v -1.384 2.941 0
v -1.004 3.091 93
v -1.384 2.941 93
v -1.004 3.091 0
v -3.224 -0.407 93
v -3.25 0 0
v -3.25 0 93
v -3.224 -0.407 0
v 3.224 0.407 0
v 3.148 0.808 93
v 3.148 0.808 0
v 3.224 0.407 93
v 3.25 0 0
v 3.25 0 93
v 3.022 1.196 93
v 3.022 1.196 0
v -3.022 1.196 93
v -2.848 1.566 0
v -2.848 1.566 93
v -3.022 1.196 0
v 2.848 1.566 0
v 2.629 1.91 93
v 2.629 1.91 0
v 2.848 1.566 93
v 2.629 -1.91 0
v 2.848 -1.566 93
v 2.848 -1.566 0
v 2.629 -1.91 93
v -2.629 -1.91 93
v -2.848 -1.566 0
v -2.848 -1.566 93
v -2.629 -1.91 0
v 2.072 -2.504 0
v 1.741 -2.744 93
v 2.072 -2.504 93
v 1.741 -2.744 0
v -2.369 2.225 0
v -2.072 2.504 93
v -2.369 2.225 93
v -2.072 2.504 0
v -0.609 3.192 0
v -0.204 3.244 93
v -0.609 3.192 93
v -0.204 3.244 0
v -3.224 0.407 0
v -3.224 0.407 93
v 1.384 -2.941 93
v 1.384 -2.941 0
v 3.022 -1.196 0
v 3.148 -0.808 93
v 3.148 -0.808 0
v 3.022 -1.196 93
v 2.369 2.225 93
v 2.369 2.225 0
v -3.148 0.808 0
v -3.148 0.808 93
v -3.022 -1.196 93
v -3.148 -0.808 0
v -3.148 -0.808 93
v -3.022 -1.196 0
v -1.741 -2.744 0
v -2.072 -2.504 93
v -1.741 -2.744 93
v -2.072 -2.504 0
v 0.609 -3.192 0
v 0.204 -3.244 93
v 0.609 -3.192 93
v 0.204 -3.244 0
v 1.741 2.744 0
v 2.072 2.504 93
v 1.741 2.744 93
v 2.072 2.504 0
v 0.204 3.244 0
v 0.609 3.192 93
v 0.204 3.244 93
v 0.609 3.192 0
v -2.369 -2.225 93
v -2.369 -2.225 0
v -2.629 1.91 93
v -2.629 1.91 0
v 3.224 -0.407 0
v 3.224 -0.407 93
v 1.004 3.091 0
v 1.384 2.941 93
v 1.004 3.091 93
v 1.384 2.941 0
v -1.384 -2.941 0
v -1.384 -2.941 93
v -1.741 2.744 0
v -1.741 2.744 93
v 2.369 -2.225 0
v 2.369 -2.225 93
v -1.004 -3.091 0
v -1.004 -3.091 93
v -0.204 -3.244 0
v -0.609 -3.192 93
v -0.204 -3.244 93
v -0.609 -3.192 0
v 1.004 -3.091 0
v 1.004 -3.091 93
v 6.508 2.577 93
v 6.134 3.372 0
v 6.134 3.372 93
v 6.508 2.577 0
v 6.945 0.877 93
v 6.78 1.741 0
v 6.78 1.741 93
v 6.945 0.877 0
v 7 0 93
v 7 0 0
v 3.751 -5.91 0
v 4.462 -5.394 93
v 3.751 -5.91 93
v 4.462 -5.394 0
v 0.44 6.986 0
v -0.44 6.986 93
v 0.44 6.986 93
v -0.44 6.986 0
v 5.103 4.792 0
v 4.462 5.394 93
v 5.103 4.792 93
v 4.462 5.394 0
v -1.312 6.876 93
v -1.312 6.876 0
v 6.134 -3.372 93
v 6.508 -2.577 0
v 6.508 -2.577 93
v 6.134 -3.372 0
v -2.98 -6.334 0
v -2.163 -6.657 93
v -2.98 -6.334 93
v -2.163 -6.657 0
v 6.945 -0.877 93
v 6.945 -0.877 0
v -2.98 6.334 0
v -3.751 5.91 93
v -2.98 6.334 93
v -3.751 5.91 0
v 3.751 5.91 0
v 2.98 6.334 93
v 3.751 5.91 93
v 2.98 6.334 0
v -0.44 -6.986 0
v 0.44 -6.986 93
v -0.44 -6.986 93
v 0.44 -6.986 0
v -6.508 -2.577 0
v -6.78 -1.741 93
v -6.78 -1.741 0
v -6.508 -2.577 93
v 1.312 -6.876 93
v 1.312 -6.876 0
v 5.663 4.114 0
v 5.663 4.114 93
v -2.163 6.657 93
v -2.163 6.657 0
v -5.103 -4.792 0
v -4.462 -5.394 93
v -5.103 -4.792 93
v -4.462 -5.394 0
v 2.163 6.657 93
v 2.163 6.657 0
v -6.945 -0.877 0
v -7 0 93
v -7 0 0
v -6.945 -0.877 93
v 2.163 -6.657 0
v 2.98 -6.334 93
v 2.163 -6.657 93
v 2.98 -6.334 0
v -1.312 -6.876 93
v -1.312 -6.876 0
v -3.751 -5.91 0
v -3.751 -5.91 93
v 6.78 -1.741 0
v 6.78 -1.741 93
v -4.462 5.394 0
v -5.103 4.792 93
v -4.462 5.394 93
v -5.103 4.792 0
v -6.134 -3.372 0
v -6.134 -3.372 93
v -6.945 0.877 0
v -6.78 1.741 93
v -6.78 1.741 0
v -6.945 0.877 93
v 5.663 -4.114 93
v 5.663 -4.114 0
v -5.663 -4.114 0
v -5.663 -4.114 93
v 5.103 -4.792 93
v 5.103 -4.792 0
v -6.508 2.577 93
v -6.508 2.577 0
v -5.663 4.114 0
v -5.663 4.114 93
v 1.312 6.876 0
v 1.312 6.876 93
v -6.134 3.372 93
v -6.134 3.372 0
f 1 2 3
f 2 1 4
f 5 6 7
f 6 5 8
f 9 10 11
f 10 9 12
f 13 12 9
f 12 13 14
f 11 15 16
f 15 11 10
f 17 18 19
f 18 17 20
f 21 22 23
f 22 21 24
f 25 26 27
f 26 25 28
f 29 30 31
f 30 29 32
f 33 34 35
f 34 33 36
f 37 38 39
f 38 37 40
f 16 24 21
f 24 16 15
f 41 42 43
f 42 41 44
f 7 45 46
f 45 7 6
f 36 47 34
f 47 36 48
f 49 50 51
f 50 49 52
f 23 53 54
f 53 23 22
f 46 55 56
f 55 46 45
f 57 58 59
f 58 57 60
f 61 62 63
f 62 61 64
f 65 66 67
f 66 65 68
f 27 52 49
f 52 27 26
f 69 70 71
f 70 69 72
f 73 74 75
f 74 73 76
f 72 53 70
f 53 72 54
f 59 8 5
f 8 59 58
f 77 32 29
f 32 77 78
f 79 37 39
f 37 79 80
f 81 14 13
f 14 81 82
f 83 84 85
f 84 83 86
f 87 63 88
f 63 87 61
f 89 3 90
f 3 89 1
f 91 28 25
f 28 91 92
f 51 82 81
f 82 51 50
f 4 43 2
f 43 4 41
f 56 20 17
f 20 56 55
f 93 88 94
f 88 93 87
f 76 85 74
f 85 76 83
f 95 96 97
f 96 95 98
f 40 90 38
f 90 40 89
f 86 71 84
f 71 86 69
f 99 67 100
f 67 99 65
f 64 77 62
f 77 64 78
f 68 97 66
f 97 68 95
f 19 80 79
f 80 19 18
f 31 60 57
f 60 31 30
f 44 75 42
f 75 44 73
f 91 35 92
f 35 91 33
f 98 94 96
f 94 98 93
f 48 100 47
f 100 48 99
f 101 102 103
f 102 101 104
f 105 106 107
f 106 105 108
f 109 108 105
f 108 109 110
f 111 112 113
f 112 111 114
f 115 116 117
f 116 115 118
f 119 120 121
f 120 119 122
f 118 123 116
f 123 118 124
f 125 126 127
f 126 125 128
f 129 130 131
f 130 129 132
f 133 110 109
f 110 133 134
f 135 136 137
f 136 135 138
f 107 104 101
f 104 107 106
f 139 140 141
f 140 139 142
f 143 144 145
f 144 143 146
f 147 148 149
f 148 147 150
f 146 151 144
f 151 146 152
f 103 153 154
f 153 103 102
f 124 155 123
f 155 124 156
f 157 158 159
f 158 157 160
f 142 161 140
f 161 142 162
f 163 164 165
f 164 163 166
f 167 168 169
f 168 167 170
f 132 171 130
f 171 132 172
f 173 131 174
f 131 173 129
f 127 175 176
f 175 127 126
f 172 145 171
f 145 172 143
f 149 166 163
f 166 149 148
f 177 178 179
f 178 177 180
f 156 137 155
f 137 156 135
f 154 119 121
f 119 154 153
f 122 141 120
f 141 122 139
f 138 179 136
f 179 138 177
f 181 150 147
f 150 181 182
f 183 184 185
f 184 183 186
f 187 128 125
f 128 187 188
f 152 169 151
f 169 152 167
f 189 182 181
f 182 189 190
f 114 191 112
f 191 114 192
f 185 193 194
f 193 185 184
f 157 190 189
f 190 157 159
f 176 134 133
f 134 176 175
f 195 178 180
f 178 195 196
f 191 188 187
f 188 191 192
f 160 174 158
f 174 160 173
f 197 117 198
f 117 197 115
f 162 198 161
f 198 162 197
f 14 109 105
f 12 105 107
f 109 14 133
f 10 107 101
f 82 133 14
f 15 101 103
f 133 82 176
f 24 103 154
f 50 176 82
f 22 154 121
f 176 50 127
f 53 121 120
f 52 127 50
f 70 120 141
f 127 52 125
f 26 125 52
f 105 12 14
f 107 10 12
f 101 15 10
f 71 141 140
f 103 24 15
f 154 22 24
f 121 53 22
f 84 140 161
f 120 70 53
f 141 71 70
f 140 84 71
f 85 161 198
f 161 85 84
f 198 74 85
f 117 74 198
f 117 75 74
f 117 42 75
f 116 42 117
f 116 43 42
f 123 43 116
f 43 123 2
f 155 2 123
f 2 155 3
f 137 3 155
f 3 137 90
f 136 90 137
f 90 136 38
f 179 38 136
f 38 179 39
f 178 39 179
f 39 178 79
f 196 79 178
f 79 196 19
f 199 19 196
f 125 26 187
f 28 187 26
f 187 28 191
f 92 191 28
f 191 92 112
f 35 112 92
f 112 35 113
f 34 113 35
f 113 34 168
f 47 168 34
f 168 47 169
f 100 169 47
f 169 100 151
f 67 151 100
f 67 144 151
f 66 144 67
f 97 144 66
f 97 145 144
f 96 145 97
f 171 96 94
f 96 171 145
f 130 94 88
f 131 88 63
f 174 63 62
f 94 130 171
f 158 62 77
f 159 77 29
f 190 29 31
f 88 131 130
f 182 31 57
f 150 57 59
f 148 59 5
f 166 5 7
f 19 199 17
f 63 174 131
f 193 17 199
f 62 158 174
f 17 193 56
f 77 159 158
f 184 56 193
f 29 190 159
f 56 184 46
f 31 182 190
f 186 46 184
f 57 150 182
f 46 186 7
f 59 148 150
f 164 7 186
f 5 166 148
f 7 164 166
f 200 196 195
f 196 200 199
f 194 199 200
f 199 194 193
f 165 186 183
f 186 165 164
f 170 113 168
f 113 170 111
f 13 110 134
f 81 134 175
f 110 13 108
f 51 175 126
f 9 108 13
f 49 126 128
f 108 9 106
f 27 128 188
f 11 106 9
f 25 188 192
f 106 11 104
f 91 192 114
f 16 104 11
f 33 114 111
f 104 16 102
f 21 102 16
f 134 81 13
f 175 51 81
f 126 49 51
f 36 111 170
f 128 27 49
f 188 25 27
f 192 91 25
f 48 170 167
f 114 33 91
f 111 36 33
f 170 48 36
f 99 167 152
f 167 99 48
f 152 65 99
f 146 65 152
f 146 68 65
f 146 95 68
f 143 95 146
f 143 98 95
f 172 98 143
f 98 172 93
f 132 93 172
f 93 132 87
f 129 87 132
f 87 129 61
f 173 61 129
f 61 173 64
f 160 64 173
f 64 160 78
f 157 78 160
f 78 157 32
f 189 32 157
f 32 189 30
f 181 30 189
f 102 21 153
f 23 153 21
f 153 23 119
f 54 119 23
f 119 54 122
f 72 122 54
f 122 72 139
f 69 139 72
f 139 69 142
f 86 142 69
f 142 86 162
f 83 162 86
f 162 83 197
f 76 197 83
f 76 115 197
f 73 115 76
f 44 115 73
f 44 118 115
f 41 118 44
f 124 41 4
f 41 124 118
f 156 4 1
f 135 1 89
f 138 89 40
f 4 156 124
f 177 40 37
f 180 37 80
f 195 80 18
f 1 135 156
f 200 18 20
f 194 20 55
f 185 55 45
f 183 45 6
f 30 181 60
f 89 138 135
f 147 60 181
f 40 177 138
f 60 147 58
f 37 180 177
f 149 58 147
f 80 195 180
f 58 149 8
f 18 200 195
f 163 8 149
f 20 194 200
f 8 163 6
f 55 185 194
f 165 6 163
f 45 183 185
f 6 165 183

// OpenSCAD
$fn = 50;


difference() {
	union() {
		*color(alpha = 1.0000000000, c = "gray") {
			translate(v = [0, 7, 0]) {
				linear_extrude(height = 1) {
					text(font = "Arial:style=Bold", halign = "center", size = 4.5000000000, text = "COMMENT plate main", valign = "center");
				}
			}
		}
		cylinder(h = 93, r = 7.0000000000);
	}
	union() {
		*color(alpha = 1.0000000000, c = "gray") {
			translate(v = [0, 7, 0]) {
				linear_extrude(height = 1) {
					text(font = "Arial:style=Bold", halign = "center", size = 4.5000000000, text = "COMMENT holes main", valign = "center");
				}
			}
		}
		translate(v = [0, 0, -100]) {
			cylinder(h = 200, r = 3.2500000000);
		}
		translate(v = [0, 0, -100]) {
			cylinder(h = 200, r = 1.8000000000);
		}
	}
}
